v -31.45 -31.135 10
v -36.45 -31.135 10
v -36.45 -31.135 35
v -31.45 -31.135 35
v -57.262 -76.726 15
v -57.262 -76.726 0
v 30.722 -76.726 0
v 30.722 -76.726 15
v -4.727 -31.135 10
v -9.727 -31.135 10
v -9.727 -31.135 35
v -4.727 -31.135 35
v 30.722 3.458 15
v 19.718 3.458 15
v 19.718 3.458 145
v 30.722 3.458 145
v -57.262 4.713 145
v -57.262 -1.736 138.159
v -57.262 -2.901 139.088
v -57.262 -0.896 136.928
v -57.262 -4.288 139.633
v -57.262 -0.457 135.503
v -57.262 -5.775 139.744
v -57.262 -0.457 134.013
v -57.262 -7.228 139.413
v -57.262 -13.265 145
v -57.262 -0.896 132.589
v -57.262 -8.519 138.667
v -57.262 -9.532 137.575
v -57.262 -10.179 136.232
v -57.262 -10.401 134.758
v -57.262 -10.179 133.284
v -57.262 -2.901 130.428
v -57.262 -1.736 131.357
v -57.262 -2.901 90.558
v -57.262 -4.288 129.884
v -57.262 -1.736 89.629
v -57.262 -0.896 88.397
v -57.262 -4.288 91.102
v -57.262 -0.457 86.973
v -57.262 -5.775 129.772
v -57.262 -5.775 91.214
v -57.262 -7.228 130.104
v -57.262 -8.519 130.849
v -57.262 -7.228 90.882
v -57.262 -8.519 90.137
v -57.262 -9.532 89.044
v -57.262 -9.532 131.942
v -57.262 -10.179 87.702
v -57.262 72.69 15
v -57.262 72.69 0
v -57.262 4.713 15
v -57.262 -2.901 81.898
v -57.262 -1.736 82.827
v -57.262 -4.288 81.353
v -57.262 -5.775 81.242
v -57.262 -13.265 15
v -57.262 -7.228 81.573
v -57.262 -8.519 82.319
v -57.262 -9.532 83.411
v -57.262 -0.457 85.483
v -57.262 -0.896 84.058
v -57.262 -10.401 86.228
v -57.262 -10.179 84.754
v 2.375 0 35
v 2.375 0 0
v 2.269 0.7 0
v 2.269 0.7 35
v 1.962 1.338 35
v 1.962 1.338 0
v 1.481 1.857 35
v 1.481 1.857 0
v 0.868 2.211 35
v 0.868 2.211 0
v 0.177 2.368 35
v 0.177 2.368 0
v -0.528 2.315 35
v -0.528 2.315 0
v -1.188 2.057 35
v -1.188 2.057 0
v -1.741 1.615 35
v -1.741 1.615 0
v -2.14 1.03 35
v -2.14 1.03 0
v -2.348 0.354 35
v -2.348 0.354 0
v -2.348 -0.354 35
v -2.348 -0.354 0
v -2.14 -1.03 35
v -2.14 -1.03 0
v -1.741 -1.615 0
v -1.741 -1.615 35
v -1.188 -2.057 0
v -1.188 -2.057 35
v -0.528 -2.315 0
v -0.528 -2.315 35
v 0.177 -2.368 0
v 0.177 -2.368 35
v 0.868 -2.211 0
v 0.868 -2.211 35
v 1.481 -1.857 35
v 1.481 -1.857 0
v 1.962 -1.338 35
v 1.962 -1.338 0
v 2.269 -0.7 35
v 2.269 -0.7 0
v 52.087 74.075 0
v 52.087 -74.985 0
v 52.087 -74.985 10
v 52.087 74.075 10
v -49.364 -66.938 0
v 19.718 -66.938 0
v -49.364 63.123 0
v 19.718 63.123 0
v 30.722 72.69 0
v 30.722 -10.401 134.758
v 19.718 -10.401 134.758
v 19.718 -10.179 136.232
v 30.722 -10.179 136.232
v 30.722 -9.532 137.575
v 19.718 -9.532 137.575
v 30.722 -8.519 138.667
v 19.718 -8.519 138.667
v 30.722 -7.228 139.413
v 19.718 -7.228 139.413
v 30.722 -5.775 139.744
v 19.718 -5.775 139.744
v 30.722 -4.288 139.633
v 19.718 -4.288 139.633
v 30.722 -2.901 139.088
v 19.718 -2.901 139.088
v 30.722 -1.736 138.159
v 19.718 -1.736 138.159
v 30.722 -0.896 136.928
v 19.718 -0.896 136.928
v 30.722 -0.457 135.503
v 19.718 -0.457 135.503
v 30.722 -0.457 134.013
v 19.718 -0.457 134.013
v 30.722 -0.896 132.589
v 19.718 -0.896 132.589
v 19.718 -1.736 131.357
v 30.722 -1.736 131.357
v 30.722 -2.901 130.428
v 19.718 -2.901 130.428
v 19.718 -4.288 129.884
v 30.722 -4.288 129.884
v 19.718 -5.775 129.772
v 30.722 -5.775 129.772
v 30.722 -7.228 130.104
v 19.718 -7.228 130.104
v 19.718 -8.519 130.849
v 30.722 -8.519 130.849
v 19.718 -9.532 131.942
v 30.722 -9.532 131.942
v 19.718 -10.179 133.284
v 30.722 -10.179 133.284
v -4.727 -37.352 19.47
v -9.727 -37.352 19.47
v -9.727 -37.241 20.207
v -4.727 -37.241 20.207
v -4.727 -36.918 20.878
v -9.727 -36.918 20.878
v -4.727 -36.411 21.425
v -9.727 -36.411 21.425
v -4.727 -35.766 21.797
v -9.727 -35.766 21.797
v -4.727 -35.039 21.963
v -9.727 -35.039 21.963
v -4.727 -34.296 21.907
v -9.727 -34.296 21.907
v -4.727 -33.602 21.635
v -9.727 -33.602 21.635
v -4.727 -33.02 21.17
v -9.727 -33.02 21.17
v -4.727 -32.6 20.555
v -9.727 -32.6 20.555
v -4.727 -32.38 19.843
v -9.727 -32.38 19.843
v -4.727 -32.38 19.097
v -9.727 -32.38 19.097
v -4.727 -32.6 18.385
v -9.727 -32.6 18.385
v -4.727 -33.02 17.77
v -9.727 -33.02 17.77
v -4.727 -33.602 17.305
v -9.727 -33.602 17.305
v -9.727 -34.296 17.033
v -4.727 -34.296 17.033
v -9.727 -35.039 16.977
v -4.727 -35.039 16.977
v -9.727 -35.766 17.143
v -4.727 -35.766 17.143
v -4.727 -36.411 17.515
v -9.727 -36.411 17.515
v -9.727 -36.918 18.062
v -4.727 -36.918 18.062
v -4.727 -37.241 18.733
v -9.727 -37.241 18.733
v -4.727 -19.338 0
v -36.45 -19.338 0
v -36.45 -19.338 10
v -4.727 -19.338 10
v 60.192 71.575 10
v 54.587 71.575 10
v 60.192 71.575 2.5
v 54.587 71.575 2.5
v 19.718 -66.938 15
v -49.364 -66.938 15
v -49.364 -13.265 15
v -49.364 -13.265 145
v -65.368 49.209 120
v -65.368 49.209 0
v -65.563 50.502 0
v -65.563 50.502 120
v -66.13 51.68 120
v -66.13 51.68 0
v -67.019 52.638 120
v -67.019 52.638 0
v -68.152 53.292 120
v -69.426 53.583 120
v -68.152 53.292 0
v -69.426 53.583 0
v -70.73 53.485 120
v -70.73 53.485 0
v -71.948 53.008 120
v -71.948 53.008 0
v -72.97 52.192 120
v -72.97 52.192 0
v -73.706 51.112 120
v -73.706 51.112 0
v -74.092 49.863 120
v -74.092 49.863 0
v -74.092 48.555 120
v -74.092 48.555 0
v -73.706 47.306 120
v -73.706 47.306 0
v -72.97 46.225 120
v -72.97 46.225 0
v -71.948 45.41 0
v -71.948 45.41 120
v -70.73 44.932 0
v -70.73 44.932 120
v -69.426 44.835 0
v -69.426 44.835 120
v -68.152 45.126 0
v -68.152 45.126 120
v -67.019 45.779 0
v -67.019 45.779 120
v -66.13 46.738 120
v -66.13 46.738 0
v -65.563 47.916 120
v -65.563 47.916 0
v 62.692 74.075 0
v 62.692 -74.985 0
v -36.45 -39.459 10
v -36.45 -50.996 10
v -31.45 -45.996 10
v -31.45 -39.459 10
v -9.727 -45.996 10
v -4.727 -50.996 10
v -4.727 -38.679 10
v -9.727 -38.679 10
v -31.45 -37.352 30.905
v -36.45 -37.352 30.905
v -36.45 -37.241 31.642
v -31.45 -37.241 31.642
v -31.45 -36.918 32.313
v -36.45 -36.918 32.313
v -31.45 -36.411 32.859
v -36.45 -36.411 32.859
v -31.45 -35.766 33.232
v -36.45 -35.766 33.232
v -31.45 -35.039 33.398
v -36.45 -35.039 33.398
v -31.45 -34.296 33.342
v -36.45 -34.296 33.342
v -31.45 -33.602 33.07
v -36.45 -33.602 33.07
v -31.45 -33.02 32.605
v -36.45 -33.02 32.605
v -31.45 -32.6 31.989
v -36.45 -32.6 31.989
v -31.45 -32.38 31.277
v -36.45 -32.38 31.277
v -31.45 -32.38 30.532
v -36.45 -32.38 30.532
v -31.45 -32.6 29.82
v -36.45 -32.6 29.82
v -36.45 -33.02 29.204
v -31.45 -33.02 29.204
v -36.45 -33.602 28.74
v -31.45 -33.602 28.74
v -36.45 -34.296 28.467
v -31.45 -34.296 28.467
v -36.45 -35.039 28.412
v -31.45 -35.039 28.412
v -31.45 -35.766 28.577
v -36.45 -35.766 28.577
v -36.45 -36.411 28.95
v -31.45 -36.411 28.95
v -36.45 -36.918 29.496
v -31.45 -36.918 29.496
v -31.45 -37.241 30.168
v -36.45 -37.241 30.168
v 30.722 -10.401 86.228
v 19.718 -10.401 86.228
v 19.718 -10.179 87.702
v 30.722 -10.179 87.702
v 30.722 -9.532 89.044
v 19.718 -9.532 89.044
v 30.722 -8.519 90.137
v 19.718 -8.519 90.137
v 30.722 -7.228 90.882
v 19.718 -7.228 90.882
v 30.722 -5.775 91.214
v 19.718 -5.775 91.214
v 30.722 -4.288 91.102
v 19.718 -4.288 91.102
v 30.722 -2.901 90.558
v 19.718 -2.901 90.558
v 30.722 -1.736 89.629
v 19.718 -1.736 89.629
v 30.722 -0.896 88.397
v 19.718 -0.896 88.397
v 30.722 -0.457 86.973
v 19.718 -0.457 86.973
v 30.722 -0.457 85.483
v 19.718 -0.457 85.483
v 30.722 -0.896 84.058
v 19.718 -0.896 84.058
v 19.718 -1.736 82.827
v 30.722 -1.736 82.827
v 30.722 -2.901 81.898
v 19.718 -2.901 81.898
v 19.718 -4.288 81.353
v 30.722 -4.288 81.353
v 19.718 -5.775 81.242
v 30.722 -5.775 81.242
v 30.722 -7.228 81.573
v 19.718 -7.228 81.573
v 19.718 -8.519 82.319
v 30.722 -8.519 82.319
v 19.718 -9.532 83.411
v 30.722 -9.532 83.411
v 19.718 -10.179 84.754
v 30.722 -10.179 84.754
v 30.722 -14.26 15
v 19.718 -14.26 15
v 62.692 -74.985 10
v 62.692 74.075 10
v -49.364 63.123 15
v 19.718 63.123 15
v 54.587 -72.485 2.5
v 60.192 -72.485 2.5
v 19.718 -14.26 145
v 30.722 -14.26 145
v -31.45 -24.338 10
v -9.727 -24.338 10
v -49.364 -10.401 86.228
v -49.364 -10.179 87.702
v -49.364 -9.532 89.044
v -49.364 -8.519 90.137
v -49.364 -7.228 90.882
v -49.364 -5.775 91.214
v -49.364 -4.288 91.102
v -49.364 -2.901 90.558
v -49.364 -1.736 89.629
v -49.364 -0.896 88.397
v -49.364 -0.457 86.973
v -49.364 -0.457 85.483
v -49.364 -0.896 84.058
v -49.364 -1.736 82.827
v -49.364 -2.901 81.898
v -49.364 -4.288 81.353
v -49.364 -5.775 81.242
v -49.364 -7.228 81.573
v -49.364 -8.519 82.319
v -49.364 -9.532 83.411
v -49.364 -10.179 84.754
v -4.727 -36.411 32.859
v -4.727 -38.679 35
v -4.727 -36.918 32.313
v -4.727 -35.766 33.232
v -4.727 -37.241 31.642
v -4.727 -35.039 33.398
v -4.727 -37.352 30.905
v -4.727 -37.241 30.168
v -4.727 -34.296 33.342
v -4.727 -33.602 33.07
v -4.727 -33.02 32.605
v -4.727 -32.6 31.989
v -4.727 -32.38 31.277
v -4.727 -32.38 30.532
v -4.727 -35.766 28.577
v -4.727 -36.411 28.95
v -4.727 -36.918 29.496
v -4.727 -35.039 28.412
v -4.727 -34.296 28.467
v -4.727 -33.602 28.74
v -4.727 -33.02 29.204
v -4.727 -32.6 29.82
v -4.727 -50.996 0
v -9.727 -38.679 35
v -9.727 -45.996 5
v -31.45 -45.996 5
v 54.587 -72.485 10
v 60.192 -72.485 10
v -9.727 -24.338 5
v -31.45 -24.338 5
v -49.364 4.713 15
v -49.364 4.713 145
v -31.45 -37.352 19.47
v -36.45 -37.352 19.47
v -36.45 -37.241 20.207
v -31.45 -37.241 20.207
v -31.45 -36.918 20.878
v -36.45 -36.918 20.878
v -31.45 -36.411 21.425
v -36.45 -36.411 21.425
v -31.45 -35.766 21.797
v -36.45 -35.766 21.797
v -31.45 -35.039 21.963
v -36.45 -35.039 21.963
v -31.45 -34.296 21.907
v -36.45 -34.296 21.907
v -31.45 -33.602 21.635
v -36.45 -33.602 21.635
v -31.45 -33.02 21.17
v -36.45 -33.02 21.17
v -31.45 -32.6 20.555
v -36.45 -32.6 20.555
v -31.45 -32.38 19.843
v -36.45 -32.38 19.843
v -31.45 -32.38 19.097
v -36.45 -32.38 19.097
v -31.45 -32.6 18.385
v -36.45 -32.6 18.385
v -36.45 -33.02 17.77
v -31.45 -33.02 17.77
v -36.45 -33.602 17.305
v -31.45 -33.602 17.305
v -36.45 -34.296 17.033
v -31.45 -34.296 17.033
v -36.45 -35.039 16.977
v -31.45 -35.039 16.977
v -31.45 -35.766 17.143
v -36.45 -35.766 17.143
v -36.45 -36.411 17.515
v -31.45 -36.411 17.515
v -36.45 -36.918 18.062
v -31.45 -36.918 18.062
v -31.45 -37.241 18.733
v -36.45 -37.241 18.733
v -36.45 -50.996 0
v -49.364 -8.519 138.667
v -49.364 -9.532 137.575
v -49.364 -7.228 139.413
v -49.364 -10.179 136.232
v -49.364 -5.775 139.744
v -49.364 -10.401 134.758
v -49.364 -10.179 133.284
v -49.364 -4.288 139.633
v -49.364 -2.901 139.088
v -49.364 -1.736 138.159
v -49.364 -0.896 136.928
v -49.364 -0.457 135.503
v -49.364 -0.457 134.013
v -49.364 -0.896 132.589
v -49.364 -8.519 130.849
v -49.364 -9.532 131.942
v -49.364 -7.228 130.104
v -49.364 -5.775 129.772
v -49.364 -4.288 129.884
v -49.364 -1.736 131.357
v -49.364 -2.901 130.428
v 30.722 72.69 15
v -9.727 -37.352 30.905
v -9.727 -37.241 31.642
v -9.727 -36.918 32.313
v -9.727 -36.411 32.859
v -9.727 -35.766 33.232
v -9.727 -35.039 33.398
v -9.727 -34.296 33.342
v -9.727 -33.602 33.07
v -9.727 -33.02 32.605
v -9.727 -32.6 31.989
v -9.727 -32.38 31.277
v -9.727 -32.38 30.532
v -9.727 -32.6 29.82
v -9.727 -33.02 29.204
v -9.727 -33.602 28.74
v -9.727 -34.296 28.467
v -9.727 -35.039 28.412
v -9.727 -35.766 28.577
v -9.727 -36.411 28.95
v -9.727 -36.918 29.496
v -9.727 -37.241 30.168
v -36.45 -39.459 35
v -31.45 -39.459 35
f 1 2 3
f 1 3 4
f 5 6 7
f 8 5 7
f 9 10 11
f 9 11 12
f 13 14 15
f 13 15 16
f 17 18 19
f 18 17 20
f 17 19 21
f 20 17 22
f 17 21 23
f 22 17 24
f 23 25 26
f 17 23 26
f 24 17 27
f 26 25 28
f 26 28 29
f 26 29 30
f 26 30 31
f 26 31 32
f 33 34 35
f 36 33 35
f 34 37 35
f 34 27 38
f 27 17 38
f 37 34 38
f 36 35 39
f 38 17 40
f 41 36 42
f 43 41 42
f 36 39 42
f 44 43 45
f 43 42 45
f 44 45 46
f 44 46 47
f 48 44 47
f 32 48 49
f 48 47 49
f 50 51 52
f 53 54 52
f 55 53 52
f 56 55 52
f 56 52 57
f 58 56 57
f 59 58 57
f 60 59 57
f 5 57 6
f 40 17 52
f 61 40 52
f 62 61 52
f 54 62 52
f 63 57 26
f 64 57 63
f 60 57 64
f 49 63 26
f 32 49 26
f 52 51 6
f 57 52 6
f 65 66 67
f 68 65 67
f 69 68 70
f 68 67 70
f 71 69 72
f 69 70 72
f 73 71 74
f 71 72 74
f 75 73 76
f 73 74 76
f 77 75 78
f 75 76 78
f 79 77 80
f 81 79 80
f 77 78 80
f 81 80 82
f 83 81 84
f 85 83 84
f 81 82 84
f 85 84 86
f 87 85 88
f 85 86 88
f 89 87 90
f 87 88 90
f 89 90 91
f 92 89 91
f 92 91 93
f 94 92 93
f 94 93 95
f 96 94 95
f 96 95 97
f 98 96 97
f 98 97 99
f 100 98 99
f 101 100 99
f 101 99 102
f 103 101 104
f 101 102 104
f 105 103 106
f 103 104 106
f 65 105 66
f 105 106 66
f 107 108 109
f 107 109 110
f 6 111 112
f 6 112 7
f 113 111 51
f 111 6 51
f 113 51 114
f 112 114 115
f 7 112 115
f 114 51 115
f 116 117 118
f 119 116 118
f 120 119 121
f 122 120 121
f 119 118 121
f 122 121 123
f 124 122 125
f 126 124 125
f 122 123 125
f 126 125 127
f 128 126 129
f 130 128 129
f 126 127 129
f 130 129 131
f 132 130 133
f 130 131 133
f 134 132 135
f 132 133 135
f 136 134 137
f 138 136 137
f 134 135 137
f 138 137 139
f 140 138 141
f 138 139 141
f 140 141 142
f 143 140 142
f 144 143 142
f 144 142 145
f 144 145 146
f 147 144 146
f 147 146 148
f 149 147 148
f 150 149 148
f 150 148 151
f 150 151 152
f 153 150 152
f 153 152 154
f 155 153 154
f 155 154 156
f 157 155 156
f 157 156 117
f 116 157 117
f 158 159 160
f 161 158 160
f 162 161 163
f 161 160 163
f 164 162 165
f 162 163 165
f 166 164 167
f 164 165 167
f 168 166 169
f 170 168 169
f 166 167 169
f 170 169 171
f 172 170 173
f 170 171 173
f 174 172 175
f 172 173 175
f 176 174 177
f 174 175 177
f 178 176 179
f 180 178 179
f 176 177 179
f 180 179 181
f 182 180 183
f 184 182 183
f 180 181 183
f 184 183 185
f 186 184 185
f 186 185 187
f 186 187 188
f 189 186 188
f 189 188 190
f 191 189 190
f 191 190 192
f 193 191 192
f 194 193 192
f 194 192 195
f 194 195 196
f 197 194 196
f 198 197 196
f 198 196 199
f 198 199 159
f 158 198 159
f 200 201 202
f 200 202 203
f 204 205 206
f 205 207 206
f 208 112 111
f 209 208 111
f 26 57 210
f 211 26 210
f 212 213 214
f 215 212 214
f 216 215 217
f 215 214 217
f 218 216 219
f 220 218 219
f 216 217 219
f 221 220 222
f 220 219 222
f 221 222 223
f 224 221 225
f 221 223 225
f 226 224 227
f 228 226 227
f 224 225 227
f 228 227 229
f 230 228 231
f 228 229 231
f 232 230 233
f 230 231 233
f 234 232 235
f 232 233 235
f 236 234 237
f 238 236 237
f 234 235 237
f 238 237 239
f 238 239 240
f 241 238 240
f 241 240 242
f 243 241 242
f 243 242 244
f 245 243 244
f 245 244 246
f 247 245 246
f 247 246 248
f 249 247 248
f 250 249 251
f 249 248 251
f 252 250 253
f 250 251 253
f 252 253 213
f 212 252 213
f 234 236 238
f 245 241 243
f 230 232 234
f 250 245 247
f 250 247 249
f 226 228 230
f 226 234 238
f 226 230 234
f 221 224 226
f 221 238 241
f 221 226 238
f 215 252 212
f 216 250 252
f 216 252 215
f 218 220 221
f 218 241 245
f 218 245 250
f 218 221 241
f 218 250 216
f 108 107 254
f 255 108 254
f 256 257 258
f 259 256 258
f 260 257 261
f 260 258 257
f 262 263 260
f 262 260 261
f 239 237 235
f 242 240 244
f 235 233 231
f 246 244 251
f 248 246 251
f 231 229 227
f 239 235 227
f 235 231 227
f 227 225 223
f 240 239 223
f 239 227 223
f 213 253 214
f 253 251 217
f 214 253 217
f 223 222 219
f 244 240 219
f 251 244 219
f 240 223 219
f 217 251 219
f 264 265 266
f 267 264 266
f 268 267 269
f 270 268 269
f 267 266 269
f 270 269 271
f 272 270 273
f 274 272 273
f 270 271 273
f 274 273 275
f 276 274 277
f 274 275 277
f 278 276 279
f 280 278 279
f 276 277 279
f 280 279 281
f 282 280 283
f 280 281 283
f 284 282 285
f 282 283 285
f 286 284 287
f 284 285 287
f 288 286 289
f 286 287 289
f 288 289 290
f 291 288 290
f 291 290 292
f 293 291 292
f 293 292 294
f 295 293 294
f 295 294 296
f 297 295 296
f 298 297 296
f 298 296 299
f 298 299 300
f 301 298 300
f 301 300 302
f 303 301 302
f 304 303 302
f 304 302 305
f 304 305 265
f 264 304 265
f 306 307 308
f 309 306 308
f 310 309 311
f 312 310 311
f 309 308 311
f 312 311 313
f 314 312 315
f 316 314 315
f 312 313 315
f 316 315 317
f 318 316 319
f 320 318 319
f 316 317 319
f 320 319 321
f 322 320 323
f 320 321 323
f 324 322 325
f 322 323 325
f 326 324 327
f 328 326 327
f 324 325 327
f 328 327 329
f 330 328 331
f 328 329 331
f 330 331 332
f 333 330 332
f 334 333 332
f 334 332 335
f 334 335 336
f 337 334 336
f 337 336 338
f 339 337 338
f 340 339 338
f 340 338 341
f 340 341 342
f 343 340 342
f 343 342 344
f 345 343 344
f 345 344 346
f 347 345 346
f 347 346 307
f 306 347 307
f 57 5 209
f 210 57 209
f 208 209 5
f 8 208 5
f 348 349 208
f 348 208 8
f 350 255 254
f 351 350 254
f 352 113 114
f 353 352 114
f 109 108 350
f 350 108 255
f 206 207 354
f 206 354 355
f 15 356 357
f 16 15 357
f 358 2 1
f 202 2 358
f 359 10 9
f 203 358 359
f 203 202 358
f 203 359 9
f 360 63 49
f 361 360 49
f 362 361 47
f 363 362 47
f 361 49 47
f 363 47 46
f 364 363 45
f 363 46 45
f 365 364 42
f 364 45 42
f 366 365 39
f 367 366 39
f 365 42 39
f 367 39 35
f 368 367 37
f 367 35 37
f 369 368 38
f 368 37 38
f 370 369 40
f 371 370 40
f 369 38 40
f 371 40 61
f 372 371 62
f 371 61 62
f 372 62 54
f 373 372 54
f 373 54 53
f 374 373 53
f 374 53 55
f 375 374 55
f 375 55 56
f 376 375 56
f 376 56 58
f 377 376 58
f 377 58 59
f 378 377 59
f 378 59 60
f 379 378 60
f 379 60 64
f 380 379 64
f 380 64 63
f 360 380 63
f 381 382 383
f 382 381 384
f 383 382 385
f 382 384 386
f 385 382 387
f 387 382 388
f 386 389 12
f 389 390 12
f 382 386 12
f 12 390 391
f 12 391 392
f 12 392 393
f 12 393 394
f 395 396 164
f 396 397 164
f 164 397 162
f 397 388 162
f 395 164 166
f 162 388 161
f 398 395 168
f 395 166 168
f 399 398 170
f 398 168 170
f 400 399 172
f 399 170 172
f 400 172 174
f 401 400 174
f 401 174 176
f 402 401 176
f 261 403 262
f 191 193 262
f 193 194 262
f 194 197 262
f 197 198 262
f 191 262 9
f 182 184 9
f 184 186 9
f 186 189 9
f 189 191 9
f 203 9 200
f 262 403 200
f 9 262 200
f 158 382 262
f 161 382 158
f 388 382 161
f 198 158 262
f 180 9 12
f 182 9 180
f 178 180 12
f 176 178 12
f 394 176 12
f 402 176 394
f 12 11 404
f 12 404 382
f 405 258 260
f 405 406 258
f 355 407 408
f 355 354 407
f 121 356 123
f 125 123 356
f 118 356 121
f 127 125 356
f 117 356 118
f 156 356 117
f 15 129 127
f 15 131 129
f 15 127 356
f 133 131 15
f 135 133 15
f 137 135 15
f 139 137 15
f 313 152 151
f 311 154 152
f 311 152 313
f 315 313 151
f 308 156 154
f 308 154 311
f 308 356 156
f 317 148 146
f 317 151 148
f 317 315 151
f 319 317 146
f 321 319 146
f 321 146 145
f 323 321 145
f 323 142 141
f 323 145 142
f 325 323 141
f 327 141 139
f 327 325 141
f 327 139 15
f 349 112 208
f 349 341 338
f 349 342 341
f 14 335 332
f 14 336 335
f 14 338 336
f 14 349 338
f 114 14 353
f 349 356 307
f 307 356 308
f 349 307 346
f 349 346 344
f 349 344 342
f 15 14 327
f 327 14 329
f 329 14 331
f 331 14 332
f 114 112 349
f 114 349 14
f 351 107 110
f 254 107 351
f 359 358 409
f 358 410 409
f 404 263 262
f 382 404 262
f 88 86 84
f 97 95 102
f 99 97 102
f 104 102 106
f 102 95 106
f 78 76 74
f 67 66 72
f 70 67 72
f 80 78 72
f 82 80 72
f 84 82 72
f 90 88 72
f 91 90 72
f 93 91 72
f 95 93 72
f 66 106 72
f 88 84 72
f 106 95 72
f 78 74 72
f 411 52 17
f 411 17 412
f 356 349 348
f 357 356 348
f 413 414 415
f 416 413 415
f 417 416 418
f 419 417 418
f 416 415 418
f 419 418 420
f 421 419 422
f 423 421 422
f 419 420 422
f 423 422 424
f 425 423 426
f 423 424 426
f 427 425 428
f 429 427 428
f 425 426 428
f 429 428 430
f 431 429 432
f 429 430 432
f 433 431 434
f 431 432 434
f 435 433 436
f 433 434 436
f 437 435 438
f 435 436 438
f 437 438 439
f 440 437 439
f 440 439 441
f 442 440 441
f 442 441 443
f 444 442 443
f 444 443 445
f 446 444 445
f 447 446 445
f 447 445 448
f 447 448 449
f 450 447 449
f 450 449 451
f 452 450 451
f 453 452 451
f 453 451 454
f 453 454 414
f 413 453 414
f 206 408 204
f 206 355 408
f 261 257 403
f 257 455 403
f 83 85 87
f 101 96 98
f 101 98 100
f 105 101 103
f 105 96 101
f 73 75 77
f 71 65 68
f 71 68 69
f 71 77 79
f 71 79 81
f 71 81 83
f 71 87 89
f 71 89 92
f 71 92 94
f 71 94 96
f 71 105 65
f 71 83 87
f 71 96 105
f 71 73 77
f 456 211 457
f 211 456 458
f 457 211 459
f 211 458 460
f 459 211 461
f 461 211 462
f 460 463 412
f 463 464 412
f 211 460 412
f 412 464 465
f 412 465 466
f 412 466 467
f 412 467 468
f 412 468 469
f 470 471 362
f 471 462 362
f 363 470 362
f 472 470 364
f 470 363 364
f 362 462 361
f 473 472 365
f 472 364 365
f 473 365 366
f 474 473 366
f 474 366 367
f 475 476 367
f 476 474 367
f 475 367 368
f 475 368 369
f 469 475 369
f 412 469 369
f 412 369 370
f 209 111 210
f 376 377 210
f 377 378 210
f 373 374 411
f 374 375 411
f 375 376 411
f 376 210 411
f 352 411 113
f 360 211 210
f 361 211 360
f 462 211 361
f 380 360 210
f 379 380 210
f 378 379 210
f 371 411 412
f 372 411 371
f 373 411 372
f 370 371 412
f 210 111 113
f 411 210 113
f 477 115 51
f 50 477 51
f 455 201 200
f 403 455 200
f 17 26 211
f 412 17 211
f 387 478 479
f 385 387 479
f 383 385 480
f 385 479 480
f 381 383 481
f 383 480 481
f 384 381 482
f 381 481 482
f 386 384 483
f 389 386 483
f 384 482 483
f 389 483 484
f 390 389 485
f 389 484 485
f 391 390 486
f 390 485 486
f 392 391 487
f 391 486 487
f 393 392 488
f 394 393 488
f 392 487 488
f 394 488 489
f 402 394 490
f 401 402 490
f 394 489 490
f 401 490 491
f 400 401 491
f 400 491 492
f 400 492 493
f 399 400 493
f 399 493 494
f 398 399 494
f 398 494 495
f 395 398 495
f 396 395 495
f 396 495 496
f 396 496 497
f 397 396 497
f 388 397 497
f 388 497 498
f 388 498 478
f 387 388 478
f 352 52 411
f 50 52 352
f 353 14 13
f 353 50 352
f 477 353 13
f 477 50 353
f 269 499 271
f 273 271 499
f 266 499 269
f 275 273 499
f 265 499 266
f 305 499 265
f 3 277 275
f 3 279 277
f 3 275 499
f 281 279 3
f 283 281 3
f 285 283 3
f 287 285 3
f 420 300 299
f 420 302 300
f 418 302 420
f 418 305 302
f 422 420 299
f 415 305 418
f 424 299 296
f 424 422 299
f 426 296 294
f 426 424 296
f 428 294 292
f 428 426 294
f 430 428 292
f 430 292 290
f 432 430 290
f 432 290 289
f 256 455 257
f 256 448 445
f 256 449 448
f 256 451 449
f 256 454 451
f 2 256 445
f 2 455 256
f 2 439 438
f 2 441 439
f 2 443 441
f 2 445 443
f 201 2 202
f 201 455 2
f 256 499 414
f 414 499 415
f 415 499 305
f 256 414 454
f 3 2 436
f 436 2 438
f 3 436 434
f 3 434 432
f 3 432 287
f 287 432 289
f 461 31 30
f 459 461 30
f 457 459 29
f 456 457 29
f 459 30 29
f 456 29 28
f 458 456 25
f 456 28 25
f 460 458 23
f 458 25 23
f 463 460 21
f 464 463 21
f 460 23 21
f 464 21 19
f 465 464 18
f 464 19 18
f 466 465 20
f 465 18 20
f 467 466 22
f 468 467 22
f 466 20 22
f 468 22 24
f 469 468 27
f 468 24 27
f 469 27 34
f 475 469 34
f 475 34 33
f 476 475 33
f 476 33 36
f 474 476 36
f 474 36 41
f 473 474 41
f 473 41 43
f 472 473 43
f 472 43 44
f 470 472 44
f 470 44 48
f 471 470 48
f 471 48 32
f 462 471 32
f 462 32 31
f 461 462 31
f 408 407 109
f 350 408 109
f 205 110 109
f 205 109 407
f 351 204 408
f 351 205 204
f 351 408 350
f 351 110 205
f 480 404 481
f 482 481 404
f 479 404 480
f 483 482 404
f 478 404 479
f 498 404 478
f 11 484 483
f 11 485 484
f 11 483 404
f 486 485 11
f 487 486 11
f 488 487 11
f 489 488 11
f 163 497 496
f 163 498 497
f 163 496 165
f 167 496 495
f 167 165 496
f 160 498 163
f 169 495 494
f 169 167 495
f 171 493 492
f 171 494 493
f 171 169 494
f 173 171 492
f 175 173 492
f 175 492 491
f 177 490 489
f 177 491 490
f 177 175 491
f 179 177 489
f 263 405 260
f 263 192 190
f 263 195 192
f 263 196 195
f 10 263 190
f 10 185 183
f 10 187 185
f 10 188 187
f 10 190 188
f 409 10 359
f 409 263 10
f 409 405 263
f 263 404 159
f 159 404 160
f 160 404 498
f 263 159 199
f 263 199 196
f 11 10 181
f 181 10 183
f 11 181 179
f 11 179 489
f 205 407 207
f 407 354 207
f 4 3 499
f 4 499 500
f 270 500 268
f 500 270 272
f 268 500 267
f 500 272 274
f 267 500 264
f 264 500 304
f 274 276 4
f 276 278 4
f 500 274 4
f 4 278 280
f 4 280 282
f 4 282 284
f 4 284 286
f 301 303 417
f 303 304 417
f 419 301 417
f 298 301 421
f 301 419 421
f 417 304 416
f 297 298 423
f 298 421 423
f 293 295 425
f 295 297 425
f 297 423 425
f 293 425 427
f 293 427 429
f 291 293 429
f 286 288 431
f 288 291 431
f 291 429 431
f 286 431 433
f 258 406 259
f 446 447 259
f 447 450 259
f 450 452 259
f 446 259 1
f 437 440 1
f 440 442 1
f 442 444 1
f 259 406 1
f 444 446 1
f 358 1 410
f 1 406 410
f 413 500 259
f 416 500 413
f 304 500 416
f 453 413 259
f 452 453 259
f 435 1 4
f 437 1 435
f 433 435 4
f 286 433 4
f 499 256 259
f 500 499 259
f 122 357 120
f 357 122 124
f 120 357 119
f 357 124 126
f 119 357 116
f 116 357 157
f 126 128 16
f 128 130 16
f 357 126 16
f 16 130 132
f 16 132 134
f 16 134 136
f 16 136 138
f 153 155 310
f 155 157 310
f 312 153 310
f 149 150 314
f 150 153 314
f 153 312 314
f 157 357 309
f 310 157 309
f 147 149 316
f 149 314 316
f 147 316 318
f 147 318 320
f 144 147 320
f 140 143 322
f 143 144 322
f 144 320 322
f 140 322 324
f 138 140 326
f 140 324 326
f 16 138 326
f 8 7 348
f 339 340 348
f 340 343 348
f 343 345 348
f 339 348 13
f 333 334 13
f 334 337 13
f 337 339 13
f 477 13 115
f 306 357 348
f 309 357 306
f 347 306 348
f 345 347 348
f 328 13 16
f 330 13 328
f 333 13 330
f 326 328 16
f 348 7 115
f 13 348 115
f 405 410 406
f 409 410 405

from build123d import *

# Parameters (mm, degrees)
F0_W      = 99.0480743349
F0_H      = 131.0261934996
F1_DEPTH  = 25
F3_D      = 80
F4_W      = 10.3947483003
F4_H      = 28.5077588633
F5_DEPTH  = 55
F7_D      = 10
F8_R      = 4.3865377981
F9_DEPTH  = 120
F10_DEPTH = 60
F12_D     = 10
F13_DEPTH = 5
F14_DEPTH = 5
F15_DEPTH = 5
F16_DEPTH = 10
F17_DEPTH = 10
F18_W     = 10.6056071818
F18_H     = 149.0600779653
F19_DEPTH = 10
F20_T     = -2.5
F20_2_T   = -2.5
F22_W     = 7.8981034458
F22_H     = 8.4575563669
F22_H_2   = 130.0605162978
F22_H_3   = 9.5668360591
F22_W_2   = 69.0817683935
F22_W_3   = 11.004479602
F22_H_4   = 9.7881406546
F23_DEPTH = 15
F24_W     = 7.8981034458
F24_H     = 17.9785350338
F24_W_2   = 11.004479602
F24_H_2   = 17.717437353
F25_DEPTH = 130
F27_D     = 10
F28_W     = 31.7221675068
F28_H     = 31.6584389657
F29_DEPTH = 5
F30_DEPTH = 5
F31_T     = -5
F32_W     = 5
F32_H     = 8.3243623376
F32_H_2   = 7.5445622206
F33_DEPTH = 25
F35_D     = 5
F36_R     = 2.375
F37_DEPTH = 35


# Not quite as in the source:
# - a shell that OpenCascade refuses in one call is made with other operations: the cavity is built on its own and cut out
# - a feature names something its author has since deleted; it is built from what else it names


with BuildPart() as f1:
    # F0 (on Top) → F1 (new body)
    with BuildSketch(Plane.XY):
        with Locations((-1.6936603934, -0.8678138256)):
            Rectangle(F0_W, F0_H)
    extrude(amount=F1_DEPTH)

    # F3 (through all)
    with Locations(Plane.XY.offset(25)):
        with Locations((0, 1.7684714403)):
            Hole(F3_D / 2)

    # F4 (on face) → F5 (join)
    with BuildSketch(Plane.XY.offset(25)):
        with Locations((-46.0203234106, -0.7940088399)):
            Rectangle(F4_W, F4_H)
        with BuildLine():
            Line((47.8303767741, -17.6419820637), (47.8303767741, 13.5616535332))
            Line((47.8303767741, 13.5616535332), (38.2219944027, 13.5616535332))
            ThreePointArc((38.2219944027, 13.5616535332), (39.5530009994, 7.7317014329), (40, 1.7684714403))
            ThreePointArc((40, 1.7684714403), (39.5530009994, -4.1947585523), (38.2219944027, -10.0247106526))
            Line((38.2219944027, -10.0247106526), (38.2219944027, -17.6419820637))
            Line((38.2219944027, -17.6419820637), (47.8303767741, -17.6419820637))
        make_face()
    extrude(amount=F5_DEPTH)

    # F7 (through all)
    with Locations(Plane(origin=(-51.2176975608, 0, 0), x_dir=(0, -1, 0), z_dir=(-1, 0, 0))):
        with Locations((0, 69.6488469839)):
            Hole(F7_D / 2)

    # F10 (add): a face of the model
    f10_faces = [f1.faces().sort_by_distance(p)[0] for p in [
        (-46.0203234106, -0.7940088399, 80),
    ]]
    extrude(f10_faces, amount=F10_DEPTH)

    # F12 (through all)
    with Locations(Plane(origin=(-51.2176975608, 0, 0), x_dir=(0, -1, 0), z_dir=(-1, 0, 0))):
        with Locations((0, 129.8670172691)):
            Hole(F12_D / 2)

    # F13 (add): a face of the model
    f13_faces = [f1.faces().sort_by_distance(p)[0] for p in [
        (-46.0203234106, -15.0478882715, 82.5),
    ]]
    extrude(f13_faces, amount=-F13_DEPTH)

    # F14 (add): a face of the model
    f14_faces = [f1.faces().sort_by_distance(p)[0] for p in [
        (43.0261855884, -17.6419820637, 52.5),
    ]]
    extrude(f14_faces, amount=-F14_DEPTH)

    # F15 (add): a face of the model
    f15_faces = [f1.faces().sort_by_distance(p)[0] for p in [
        (46.1878669746, 39.1034682287, 25),
    ]]
    extrude(f15_faces, amount=-F15_DEPTH)

    # F16 (add): a face of the model
    f16_faces = [f1.faces().sort_by_distance(p)[0] for p in [
        (46.1878669746, 39.1034682287, 25),
    ]]
    extrude(f16_faces, amount=-F16_DEPTH)

    # F17 (add): a face of the model
    f17_faces = [f1.faces().sort_by_distance(p)[0] for p in [
        (46.1878669746, 39.1034682287, 25),
    ]]
    extrude(f17_faces, amount=-F17_DEPTH)

    # F20#2: a shell. OpenCascade refuses it in one call, so the cavity is built on its own and cut out:
    # the body offset inwards by the wall thickness, plus a prism from it out through each open face.
    f20_2_core = offset(f1.part, amount=F20_2_T, mode=Mode.PRIVATE)
    f20_2_exits = [f20_2_core.faces().sort_by_distance(p)[0] for p in [
        (-2.773323, -45.938788, 22.5),
        (-2.856032, 45.670287, 22.5),
    ]]
    add(f20_2_core, mode=Mode.SUBTRACT)
    extrude(f20_2_exits, amount=-F20_2_T, mode=Mode.SUBTRACT)


with BuildPart() as f9:
    # F8 (on Top) → F9 (new body)
    with BuildSketch(Plane.XY):
        with Locations((-69.7542577982, 49.2088384926)):
            Circle(F8_R)
    extrude(amount=F9_DEPTH)


with BuildPart() as f19:
    # F18 (on Top) → F19 (new body)
    with BuildSketch(Plane.XY):
        with Locations((57.3895256966, -0.4549883306)):
            Rectangle(F18_W, F18_H)
    extrude(amount=F19_DEPTH)

    # F20
    f20_openings = [f19.faces().sort_by_distance(p)[0] for p in [
        (57.389526, -0.454988, 10),
    ]]
    offset(amount=F20_T, openings=f20_openings)


with BuildPart() as f23:
    # F22 (on Top) → F23 (new body)
    with BuildSketch(Plane.XY):
        Polygon((-49.3639744818, -75.395129621), (-57.2620779276, -75.395129621), (-57.2620779276, -76.7257139087), (19.7177939117, -76.7257139087), (19.7177939117, -66.9375732541), (-49.3639744818, -66.9375732541), align=None)
        with Locations((-53.3130262047, -71.1663514376)):
            Rectangle(F22_W, F22_H)
        with Locations((-53.3130262047, -1.9073151052)):
            Rectangle(F22_W, F22_H_2)
        with Locations((-53.3130262047, 67.9063610733)):
            Rectangle(F22_W, F22_H_3)
        with Locations((-14.8230902851, 67.9063610733)):
            Rectangle(F22_W_2, F22_H_3)
        with Locations((25.2200337127, 67.9063610733)):
            Rectangle(F22_W_3, F22_H_3)
        with Locations((25.2200337127, -1.9073151052)):
            Rectangle(F22_W_3, F22_H_2)
        with Locations((25.2200337127, -71.8316435814)):
            Rectangle(F22_W_3, F22_H_4)
    extrude(amount=F23_DEPTH)

    # F24 (on face) → F25 (join)
    with BuildSketch(Plane.XY.offset(15)):
        with Locations((-53.3130262047, -4.2759669013)):
            Rectangle(F24_W, F24_H)
        with Locations((25.2200337127, -5.4010595195)):
            Rectangle(F24_W_2, F24_H_2)
    extrude(amount=F25_DEPTH)

    # F27 (through all)
    with Locations(Plane.YZ.offset(30.7222735137)):
        with Locations((-5.4010595195, 134.7581446171), (-5.4010595195, 86.2278193235)):
            Hole(F27_D / 2)


with BuildPart() as f29:
    # F28 (on Top) → F29 (new body)
    with BuildSketch(Plane.XY):
        with Locations((-20.5884641036, -35.1668419316)):
            Rectangle(F28_W, F28_H)
    extrude(amount=F29_DEPTH)

    # F30 (add): a face of the model
    f30_faces = [f29.faces().sort_by_distance(p)[0] for p in [
        (-20.5884641036, -35.1668419316, 5),
    ]]
    extrude(f30_faces, amount=F30_DEPTH)

    # F31
    f31_openings = [f29.faces().sort_by_distance(p)[0] for p in [
        (-20.588464, -35.166842, 10),
    ]]
    offset(amount=F31_T, openings=f31_openings)

    # F32 (on face) → F33 (join)
    with BuildSketch(Plane.XY.offset(10)):
        with Locations((-33.949547857, -35.2967381477)):
            Rectangle(F32_W, F32_H)
        with Locations((-7.2273803502, -34.9068380892)):
            Rectangle(F32_W, F32_H_2)
    extrude(amount=F33_DEPTH)

    # F35 (through all)
    with Locations(Plane.YZ.offset(-4.7273803502)):
        with Locations((-34.8523966968, 30.9046246111), (-34.8523966968, 19.4699745625)):
            Hole(F35_D / 2)


with BuildPart() as f37:
    # F36 (on Top) → F37 (new body)
    with BuildSketch(Plane.XY):
        Circle(F36_R)
    extrude(amount=F37_DEPTH)


solid = Compound([f9.part, f19.part, f23.part, f29.part, f37.part])
